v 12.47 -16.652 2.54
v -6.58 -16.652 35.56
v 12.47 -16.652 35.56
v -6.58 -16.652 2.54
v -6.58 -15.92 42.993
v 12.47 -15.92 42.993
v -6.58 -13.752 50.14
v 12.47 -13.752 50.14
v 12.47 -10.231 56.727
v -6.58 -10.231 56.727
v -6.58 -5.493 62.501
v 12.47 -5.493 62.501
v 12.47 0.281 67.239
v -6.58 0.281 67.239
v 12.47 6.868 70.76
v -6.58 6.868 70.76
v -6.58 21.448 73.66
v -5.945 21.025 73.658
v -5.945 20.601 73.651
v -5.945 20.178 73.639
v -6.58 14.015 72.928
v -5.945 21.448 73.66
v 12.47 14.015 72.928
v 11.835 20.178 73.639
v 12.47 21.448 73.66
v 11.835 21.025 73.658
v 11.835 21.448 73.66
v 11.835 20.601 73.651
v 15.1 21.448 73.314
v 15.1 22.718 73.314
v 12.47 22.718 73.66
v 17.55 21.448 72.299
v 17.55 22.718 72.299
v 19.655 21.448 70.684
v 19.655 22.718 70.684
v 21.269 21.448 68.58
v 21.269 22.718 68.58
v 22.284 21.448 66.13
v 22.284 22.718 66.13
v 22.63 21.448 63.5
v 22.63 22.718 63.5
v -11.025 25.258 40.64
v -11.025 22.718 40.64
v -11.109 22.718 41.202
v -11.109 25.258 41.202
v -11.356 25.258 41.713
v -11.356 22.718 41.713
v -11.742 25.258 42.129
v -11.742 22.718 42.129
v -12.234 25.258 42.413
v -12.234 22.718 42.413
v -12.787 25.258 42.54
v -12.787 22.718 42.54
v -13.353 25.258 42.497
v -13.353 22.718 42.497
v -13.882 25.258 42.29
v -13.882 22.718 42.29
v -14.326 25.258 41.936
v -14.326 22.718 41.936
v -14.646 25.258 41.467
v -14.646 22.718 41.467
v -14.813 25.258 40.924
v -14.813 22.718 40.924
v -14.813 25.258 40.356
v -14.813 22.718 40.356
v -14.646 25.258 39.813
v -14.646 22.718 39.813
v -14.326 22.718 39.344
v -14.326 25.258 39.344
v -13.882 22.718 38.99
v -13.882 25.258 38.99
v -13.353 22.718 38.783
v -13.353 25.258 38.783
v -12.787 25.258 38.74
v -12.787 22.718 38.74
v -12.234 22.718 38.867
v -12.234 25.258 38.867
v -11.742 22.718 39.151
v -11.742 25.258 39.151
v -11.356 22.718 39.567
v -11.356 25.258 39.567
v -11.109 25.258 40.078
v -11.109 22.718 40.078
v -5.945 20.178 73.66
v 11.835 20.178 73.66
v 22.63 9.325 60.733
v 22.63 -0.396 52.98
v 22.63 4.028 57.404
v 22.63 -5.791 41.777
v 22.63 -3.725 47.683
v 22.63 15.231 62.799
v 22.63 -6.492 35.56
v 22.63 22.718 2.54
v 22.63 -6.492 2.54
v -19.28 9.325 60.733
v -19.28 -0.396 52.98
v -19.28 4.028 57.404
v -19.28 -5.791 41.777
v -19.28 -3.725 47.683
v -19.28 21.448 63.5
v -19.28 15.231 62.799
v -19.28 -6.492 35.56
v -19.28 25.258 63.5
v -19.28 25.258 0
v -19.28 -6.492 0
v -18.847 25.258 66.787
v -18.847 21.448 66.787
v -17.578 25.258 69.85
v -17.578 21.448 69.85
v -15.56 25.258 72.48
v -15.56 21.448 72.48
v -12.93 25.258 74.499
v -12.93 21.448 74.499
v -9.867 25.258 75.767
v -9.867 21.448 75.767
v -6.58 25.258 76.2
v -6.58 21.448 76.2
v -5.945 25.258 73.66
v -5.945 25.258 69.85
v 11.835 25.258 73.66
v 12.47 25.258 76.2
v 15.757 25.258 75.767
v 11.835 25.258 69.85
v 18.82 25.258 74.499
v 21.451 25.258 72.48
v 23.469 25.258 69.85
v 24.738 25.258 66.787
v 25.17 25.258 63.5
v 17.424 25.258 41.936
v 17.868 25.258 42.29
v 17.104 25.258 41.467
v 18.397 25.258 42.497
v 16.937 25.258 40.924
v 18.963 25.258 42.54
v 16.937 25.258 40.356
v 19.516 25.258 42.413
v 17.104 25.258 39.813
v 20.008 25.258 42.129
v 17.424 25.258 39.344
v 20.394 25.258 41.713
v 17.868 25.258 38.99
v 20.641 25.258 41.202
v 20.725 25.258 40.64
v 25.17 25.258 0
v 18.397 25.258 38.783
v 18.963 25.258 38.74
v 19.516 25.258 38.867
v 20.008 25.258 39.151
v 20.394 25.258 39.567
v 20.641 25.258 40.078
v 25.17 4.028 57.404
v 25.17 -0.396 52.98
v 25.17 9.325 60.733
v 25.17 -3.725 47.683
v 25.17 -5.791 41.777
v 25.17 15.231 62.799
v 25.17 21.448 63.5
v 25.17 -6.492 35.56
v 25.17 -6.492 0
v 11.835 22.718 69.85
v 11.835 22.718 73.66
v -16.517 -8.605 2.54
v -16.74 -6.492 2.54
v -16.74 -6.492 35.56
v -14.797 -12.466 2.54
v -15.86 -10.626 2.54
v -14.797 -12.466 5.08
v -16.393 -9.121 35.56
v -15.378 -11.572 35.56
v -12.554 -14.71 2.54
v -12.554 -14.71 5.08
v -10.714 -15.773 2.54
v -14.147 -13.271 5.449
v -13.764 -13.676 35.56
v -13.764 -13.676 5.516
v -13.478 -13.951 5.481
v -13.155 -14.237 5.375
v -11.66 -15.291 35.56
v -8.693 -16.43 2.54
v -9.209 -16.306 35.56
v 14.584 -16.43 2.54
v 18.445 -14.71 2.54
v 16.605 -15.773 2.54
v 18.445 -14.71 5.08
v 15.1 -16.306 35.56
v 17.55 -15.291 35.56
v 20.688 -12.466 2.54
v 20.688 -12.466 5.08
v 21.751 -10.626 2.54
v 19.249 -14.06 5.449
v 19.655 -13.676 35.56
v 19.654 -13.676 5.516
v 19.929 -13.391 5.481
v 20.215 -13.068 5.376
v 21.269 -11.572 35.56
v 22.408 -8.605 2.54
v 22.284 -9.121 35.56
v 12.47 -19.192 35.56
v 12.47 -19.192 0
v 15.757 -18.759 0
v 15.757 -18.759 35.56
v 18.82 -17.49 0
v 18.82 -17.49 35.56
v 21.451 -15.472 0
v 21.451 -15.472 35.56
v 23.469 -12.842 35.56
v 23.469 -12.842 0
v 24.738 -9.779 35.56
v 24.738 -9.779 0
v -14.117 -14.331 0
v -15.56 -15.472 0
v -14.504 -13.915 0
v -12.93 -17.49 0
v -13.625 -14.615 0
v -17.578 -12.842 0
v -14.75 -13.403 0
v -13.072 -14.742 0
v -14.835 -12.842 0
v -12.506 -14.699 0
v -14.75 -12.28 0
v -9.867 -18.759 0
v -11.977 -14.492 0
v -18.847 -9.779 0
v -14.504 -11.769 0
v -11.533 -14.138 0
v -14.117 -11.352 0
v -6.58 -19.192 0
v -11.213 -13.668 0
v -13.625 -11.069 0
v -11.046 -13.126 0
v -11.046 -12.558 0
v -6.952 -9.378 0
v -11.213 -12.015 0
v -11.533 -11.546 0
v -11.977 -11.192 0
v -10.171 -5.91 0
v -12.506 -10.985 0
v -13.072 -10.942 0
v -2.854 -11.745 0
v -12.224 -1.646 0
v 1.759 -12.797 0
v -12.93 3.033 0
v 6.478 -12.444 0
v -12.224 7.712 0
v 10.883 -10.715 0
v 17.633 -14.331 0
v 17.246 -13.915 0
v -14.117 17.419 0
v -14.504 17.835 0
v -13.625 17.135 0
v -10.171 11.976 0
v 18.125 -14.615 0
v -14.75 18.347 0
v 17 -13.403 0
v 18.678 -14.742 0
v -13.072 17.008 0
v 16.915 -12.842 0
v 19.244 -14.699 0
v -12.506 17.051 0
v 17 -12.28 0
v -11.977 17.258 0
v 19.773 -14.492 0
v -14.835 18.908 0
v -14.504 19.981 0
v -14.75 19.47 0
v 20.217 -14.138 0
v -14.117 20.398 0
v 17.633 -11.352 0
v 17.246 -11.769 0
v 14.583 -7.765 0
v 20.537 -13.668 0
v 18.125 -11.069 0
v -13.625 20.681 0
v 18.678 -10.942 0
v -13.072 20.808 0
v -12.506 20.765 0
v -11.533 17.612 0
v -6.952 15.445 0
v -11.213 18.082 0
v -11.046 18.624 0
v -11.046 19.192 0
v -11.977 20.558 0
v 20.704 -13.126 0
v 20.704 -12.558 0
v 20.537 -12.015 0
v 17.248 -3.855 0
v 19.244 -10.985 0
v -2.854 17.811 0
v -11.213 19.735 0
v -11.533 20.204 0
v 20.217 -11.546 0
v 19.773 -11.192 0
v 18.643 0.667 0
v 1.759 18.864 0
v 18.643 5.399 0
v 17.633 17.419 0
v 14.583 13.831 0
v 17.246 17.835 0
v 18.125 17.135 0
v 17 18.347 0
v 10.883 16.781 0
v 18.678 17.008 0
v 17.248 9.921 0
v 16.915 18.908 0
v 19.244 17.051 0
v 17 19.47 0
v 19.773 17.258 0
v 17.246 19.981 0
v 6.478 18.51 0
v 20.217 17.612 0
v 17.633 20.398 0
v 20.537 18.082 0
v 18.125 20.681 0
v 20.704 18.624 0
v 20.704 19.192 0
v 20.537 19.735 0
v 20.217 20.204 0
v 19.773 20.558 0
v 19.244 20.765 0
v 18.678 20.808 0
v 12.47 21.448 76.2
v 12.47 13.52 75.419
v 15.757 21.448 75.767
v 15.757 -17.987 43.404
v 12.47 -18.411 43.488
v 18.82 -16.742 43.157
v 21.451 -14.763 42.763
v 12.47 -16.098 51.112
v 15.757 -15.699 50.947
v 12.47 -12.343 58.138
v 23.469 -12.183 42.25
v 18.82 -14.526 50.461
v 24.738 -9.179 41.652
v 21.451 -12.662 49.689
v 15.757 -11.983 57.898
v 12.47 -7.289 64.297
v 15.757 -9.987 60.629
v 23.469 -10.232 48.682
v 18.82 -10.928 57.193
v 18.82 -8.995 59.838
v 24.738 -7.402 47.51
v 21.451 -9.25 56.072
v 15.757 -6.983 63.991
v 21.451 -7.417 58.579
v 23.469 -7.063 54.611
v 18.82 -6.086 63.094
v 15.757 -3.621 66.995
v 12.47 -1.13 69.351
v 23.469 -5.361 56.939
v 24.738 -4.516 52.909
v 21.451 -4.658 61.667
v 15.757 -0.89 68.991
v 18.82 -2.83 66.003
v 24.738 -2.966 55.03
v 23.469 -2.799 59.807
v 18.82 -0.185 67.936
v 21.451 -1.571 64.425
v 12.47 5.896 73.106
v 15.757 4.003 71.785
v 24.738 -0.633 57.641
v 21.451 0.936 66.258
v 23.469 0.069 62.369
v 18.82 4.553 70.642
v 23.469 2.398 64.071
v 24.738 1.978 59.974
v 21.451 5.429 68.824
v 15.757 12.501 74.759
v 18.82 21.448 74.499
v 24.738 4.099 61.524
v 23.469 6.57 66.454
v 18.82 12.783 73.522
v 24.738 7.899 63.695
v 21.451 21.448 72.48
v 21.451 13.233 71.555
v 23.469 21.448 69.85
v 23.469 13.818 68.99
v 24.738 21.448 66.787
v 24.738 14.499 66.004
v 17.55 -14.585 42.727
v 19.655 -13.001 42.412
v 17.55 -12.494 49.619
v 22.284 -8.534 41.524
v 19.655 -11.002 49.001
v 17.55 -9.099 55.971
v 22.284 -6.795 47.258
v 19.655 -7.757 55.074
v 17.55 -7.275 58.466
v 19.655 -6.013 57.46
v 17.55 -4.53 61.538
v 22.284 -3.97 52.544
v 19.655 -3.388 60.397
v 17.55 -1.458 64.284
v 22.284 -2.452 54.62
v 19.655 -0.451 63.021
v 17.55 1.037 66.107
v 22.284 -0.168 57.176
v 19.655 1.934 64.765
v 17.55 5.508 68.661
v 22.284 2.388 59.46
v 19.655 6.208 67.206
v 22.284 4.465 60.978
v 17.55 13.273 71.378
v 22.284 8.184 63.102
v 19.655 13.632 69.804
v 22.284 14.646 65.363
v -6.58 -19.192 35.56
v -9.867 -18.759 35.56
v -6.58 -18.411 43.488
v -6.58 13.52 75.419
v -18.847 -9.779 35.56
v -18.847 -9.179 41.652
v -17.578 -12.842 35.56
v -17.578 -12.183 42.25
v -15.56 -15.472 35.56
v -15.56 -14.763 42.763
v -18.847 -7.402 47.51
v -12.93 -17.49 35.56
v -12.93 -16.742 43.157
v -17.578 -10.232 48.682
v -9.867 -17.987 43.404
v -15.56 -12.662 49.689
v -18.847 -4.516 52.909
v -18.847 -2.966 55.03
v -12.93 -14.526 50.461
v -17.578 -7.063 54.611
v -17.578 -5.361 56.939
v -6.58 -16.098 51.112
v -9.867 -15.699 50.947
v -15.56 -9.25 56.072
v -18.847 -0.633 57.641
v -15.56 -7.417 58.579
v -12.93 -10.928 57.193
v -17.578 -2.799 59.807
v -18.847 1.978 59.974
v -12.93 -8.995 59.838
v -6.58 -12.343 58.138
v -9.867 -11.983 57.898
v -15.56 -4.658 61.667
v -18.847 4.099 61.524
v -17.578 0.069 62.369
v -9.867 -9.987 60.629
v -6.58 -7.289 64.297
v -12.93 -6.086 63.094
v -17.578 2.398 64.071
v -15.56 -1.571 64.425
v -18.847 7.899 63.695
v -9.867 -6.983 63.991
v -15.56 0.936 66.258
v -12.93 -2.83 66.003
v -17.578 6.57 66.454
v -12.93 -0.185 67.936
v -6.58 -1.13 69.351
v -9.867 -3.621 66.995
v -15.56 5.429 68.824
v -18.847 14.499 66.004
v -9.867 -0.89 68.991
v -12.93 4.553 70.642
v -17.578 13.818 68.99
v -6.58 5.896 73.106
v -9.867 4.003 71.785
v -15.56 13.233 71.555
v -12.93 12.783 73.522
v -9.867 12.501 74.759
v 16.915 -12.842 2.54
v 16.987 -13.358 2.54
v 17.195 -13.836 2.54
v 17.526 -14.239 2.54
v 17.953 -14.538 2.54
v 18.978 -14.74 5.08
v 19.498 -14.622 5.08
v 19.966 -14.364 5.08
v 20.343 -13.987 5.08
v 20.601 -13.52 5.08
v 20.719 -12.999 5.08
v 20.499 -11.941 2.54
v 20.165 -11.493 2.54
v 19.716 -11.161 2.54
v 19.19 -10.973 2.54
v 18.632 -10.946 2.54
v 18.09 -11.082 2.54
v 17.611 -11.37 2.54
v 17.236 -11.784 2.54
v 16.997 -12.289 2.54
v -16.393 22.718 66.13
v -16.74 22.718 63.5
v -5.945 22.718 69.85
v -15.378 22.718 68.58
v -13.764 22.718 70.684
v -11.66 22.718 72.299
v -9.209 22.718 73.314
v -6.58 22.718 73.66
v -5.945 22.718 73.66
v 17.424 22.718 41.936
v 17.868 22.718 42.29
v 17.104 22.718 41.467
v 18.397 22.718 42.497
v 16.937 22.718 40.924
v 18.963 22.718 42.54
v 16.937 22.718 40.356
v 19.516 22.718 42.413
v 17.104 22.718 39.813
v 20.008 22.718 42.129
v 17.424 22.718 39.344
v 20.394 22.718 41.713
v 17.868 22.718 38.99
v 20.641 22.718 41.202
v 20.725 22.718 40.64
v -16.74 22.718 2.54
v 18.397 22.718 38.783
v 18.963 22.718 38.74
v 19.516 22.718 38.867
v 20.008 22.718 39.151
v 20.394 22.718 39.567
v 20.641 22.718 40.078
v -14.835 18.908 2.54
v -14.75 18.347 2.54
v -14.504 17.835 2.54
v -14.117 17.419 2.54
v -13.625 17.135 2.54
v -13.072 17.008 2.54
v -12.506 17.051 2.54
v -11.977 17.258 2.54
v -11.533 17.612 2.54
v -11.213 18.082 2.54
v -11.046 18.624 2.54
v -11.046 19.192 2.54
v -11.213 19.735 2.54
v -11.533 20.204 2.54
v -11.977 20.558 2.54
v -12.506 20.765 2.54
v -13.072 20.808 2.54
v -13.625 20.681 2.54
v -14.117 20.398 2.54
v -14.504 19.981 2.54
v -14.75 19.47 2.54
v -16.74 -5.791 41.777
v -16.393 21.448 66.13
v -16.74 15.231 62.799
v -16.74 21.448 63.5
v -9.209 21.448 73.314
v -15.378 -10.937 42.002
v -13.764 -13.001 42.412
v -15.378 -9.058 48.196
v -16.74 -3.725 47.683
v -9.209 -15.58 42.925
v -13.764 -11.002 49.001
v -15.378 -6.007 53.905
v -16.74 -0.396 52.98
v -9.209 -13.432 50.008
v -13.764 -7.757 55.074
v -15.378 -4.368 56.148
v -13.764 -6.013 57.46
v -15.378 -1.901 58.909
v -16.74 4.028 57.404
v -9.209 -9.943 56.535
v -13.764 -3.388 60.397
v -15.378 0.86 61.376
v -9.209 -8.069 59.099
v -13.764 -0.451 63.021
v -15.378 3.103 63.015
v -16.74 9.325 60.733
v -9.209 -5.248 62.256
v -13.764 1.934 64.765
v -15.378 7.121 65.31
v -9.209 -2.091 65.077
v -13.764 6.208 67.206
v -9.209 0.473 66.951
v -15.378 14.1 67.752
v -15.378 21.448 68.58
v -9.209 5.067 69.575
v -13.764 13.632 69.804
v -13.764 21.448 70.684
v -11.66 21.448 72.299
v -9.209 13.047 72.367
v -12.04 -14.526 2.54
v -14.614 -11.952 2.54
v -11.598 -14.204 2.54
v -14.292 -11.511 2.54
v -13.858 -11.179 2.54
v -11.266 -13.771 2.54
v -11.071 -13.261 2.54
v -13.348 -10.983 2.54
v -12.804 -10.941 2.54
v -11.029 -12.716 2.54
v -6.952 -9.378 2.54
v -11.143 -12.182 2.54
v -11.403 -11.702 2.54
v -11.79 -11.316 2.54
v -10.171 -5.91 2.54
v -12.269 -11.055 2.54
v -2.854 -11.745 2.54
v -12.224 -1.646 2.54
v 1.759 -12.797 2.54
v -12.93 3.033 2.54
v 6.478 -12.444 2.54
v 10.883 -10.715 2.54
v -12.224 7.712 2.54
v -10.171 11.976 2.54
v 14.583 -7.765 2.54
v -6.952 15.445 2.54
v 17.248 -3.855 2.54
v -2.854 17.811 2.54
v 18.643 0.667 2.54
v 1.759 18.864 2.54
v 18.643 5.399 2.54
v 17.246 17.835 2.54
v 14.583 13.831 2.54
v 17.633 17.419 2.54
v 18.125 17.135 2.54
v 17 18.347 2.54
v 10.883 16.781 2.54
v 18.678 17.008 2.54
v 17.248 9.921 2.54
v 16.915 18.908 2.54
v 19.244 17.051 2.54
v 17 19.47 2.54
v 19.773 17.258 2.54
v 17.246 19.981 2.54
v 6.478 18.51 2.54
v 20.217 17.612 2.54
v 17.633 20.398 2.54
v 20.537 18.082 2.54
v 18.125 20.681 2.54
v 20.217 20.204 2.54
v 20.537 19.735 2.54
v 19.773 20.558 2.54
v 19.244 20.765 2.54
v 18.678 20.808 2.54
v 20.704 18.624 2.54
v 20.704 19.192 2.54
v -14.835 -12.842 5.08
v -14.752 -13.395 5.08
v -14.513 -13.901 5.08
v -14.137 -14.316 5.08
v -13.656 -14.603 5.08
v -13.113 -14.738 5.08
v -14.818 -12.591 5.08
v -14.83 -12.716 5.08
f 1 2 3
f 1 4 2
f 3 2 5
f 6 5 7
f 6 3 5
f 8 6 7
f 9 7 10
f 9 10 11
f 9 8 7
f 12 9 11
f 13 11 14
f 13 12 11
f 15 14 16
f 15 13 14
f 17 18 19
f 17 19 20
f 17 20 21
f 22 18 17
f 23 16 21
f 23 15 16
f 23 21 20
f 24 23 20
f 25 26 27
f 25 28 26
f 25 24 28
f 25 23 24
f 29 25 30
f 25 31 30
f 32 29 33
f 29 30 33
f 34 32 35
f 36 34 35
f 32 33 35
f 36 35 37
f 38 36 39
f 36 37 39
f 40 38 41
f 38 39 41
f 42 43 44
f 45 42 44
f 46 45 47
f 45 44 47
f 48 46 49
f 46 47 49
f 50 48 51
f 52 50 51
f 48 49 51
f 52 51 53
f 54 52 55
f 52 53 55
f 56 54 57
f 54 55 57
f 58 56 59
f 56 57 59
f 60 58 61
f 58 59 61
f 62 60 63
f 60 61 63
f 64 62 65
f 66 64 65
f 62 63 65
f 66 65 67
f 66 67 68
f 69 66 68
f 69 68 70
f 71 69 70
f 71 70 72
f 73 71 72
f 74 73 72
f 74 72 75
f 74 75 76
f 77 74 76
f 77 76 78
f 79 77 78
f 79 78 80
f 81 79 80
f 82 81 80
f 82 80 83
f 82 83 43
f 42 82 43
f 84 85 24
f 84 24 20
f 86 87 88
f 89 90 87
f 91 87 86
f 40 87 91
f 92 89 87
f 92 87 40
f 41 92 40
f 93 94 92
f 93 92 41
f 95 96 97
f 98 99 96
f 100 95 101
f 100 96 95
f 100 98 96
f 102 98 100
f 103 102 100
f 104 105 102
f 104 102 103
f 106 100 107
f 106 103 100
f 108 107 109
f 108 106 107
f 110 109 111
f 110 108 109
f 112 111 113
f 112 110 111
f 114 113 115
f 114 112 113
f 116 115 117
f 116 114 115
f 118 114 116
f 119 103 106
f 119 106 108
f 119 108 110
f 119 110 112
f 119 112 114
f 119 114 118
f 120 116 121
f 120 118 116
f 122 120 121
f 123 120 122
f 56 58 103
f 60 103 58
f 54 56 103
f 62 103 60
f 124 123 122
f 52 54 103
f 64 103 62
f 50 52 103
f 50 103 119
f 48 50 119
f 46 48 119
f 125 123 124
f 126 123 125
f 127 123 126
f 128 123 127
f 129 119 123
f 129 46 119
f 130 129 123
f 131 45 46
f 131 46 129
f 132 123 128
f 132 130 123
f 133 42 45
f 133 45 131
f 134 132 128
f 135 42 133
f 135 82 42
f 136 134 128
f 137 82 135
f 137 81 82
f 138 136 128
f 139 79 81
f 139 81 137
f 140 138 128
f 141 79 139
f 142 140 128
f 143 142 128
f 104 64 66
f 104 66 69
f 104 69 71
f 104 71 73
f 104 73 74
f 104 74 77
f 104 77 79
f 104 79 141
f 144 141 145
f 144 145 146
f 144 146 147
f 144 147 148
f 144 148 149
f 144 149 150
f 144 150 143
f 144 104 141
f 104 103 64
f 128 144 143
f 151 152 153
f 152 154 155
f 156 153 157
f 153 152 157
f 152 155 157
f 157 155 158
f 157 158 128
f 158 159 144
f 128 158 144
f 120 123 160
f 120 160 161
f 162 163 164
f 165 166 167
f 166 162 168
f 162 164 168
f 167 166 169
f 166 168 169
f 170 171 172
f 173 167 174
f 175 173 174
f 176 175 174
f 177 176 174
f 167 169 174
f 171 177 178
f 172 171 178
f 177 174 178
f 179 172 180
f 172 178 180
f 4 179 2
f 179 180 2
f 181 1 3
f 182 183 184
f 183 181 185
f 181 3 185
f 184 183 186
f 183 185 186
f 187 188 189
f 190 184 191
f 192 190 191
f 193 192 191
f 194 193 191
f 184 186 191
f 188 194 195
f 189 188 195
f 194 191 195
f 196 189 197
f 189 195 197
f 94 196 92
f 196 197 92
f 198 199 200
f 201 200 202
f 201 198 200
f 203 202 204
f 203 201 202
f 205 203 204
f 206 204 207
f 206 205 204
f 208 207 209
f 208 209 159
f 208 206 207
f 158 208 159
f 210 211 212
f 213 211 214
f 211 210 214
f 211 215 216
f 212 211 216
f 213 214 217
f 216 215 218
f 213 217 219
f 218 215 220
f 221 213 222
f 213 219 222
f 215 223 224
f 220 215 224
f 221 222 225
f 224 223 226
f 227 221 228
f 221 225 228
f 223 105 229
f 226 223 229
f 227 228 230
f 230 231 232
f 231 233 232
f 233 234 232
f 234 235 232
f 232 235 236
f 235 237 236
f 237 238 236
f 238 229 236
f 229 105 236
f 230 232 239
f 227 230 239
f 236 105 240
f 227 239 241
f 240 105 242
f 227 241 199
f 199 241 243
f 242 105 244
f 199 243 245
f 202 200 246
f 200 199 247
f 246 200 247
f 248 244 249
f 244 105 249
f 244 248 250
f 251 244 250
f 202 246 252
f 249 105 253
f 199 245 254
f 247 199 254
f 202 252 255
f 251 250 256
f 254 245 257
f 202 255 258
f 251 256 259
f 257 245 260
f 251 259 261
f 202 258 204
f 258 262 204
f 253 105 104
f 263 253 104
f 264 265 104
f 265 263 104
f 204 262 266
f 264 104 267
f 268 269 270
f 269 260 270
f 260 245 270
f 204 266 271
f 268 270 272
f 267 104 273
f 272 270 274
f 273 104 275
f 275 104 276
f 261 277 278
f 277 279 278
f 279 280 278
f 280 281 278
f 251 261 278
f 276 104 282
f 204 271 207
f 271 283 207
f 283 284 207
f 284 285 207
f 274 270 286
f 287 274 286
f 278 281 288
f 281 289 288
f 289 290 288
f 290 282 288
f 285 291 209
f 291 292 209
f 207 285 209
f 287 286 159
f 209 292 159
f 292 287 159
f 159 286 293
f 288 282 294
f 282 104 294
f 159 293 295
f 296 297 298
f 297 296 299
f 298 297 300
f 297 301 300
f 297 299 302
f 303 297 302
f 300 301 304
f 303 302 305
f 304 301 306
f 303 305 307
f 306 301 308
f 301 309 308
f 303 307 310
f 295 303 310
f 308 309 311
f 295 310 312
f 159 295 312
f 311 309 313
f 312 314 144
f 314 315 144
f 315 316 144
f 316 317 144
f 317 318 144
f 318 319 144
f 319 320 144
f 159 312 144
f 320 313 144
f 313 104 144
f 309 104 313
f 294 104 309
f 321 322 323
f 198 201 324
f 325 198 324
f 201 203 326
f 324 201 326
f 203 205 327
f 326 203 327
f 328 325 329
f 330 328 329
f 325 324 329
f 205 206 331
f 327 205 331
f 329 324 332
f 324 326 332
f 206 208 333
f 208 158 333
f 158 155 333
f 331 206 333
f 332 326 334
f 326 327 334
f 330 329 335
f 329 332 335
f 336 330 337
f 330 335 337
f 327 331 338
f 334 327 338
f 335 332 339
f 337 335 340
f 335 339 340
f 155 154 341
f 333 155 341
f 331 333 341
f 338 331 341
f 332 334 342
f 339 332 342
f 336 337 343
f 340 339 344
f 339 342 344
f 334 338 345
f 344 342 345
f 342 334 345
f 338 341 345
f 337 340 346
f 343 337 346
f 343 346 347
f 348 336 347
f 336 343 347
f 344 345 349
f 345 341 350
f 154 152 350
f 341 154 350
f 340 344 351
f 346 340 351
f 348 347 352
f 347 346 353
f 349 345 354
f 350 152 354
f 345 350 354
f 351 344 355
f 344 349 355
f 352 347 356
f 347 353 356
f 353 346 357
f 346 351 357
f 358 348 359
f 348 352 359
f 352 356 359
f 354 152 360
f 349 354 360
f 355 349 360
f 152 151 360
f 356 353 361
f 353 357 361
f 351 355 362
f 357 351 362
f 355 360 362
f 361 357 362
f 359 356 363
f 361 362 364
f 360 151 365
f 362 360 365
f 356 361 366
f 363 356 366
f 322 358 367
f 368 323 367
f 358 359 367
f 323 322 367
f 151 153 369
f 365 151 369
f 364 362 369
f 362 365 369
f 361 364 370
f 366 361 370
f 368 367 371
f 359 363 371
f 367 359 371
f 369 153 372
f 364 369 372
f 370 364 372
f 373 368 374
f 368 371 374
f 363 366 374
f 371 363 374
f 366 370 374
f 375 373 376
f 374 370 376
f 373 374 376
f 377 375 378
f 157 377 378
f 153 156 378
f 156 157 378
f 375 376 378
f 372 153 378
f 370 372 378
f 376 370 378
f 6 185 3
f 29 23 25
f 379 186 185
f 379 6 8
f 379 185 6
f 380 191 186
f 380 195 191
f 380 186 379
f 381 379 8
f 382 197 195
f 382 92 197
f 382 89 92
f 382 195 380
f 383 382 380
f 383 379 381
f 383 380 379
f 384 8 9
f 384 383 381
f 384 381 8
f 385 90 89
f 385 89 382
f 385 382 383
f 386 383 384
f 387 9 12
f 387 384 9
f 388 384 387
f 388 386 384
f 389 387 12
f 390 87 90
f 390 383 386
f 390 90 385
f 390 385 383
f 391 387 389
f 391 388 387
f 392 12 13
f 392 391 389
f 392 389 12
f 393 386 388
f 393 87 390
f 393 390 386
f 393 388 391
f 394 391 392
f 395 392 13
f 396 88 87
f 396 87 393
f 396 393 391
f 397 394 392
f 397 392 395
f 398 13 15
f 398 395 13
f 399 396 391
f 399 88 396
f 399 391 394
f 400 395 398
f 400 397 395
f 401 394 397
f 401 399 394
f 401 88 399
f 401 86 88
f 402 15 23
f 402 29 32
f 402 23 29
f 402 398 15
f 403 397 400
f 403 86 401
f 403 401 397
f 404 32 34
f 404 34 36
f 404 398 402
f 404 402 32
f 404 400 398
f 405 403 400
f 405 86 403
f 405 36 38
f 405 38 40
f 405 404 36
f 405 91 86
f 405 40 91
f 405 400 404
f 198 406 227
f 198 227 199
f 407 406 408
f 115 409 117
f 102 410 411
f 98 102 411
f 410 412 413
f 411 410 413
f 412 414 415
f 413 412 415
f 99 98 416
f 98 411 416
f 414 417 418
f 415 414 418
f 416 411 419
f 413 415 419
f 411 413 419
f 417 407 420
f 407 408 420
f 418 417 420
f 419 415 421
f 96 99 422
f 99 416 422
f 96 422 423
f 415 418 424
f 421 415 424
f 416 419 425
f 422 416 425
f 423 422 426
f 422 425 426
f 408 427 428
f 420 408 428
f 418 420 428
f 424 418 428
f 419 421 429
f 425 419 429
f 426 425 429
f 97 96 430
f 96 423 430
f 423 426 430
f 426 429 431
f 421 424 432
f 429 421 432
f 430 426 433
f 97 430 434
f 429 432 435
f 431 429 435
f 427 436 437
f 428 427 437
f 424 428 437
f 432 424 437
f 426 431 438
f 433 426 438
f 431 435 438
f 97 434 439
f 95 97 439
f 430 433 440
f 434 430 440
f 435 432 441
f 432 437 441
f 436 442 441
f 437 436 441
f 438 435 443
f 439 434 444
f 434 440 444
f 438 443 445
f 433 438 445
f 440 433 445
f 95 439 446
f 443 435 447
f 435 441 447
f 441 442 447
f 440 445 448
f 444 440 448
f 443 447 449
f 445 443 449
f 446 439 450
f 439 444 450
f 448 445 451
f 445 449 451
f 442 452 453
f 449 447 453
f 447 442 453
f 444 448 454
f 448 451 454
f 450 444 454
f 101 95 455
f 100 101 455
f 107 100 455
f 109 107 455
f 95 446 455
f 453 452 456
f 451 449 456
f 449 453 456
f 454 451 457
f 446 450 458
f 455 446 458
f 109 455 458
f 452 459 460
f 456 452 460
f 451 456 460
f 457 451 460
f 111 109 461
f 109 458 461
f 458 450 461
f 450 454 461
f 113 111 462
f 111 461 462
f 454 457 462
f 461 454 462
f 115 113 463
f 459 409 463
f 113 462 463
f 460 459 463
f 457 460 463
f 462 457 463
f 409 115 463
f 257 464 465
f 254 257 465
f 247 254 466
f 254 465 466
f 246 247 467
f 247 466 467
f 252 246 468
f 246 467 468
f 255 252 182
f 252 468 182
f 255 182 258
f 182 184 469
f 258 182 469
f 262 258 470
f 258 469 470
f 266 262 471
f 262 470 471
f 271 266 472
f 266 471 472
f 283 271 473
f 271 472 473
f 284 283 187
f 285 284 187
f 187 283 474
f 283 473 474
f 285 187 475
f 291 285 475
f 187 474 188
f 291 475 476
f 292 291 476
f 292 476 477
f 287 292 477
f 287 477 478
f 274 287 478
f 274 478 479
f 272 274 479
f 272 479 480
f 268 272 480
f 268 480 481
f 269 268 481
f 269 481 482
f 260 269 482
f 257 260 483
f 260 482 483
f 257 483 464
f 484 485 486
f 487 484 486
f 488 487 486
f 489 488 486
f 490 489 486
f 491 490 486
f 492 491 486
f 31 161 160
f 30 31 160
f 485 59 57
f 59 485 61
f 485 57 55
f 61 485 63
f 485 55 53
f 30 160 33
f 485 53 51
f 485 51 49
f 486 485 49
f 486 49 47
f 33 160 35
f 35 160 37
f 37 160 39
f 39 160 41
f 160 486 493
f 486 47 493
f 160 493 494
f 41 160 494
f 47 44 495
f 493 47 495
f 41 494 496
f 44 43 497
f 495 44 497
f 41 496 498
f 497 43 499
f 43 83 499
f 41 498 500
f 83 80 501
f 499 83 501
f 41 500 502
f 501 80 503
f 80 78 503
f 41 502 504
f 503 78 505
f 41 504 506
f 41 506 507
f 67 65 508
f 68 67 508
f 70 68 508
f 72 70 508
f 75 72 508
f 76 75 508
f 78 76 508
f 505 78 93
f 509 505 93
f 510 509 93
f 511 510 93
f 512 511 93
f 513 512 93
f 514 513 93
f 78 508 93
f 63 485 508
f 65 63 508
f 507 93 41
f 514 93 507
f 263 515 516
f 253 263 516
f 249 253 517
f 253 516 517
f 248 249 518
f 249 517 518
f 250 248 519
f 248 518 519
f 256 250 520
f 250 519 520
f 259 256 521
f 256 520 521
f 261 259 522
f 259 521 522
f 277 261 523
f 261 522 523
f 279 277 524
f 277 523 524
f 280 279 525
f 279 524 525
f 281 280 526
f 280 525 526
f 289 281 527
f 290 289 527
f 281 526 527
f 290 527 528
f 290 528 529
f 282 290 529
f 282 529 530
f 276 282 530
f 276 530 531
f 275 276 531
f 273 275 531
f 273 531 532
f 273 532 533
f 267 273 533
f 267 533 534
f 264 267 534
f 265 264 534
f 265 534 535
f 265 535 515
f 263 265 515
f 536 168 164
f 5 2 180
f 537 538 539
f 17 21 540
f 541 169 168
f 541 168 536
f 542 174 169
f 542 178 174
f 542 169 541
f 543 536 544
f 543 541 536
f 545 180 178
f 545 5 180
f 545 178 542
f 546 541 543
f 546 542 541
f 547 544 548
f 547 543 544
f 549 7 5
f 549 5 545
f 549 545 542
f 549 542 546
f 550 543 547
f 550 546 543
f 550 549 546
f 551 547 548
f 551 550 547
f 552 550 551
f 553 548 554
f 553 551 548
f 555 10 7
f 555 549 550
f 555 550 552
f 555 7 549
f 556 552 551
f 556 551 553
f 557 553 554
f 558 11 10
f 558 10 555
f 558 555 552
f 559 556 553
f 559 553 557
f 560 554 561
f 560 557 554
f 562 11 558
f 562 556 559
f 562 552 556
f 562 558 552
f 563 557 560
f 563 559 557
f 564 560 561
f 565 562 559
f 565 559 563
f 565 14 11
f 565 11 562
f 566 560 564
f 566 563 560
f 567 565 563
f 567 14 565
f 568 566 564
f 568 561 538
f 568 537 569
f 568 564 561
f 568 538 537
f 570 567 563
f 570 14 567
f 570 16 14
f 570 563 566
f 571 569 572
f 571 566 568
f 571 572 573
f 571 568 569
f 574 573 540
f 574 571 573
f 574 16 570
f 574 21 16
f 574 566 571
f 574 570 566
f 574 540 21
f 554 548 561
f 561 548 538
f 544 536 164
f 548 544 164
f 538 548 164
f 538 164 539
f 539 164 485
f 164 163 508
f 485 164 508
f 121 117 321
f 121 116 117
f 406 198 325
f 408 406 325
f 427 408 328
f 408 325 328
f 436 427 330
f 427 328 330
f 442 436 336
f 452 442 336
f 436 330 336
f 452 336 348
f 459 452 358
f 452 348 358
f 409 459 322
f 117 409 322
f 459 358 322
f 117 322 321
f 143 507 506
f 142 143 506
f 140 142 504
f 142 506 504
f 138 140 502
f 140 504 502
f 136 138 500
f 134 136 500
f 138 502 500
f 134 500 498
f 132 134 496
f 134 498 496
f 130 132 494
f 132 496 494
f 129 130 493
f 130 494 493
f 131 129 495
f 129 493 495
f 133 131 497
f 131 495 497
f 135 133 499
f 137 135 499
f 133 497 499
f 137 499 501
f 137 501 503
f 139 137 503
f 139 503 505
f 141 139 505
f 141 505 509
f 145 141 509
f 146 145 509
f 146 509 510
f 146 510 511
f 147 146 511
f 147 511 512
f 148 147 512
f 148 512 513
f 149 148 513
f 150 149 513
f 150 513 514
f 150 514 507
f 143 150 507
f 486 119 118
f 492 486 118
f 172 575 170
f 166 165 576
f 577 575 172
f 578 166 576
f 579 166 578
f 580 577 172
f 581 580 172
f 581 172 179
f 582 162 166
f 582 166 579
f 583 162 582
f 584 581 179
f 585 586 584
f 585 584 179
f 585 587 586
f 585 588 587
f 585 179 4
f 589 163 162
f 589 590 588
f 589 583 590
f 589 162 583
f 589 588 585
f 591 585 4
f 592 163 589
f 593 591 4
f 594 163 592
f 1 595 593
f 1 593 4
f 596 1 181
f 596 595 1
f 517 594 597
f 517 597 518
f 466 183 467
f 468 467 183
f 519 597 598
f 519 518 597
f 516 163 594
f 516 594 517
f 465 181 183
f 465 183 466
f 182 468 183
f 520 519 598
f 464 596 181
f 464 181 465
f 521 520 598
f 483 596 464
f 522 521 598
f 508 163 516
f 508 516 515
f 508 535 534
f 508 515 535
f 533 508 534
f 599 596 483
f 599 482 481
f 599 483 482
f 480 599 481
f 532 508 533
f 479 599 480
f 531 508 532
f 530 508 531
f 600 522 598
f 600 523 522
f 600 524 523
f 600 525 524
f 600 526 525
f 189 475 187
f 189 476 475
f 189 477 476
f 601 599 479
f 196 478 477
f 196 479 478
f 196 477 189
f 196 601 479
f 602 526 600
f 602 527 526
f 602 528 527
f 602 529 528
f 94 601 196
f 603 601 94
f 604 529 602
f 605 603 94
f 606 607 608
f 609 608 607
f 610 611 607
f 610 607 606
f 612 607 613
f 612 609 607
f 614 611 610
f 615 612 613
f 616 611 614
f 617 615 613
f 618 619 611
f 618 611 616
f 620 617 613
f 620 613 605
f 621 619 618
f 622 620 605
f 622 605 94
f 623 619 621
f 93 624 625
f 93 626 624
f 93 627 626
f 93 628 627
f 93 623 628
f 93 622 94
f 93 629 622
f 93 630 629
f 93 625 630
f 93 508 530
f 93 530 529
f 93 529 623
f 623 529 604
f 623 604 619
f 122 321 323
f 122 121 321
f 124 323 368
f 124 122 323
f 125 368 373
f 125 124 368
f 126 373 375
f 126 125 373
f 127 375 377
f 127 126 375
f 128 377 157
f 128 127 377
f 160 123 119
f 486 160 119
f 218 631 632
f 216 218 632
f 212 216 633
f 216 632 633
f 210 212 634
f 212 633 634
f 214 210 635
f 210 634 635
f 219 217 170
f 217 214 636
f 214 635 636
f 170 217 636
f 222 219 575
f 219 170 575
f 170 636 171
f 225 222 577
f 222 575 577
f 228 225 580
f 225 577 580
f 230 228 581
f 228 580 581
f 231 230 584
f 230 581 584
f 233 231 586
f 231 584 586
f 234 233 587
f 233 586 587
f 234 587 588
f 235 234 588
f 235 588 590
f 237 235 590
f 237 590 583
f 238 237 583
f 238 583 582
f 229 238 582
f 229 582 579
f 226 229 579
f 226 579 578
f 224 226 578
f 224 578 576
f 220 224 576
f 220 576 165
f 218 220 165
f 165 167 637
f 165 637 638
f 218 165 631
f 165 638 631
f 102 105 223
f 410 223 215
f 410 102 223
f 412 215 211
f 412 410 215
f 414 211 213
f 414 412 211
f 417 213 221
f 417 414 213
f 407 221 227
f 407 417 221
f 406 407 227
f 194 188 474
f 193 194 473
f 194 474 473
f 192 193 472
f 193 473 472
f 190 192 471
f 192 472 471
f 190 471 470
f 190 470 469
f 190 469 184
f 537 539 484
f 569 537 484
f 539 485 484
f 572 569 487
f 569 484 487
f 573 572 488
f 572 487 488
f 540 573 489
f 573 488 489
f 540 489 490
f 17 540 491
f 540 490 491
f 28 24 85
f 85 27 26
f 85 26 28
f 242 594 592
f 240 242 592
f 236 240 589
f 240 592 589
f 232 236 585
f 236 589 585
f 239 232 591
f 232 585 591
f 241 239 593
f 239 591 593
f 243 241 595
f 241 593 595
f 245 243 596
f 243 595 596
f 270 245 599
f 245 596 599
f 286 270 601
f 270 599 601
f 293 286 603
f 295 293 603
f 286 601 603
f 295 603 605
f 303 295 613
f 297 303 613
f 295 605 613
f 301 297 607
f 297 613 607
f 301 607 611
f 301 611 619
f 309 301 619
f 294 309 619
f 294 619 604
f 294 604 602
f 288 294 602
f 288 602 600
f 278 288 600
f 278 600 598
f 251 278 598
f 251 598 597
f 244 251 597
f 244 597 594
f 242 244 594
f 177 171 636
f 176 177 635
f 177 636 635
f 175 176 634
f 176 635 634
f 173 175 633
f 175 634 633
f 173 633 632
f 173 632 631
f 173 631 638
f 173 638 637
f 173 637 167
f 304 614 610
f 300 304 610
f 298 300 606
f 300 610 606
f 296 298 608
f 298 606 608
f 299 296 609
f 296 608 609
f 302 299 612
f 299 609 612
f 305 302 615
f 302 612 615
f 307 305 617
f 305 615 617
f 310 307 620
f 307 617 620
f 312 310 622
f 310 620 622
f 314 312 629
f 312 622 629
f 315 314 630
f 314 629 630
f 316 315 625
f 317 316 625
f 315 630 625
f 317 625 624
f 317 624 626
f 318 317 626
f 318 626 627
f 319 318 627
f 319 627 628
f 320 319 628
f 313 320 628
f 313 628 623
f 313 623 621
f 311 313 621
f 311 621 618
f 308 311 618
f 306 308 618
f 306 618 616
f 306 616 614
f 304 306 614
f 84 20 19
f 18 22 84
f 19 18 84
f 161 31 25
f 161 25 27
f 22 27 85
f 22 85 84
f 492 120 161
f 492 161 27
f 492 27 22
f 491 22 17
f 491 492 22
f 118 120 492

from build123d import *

# Parameters (mm, degrees)
F0_W      = 44.45
F0_H      = 44.45
F1_DEPTH  = 76.2
F2_R      = 40.64
F4_R      = 12.7
F6_T      = -2.54
F3_W      = 17.78
F3_H      = 3.81
F7_DEPTH  = 5.08
F8_D      = 3.81
F8_DEPTH  = 5.08
F8_TIP    = 1.1446394792
F9_D      = 3.81
F9_DEPTH  = 5.08
F9_TIP    = 1.1446394792
F10_D     = 31.75
F10_DEPTH = 5.08
F10_TIP   = 9.5386623271


with BuildPart() as f1:
    # F0 (on Top) → F1 (new body)
    with BuildSketch(Plane.XY):
        with Locations((2.945480904, 3.0331164956)):
            Rectangle(F0_W, F0_H)
    extrude(amount=F1_DEPTH)

    # F2
    f2_edges = [f1.edges().sort_by_distance(p)[0] for p in [
        (2.945481, -19.191884, 76.2),
    ]]
    fillet(f2_edges, radius=F2_R)

    # F4
    f4_edges = [f1.edges().sort_by_distance(p)[0] for p in [
        (25.170481, -7.288703, 64.29682),
        (-19.279519, -7.288703, 64.29682),
    ]]
    fillet(f4_edges, radius=F4_R)

    # F6 (hollow: no face is removed)
    offset(amount=F6_T, mode=Mode.SUBTRACT)

    # F3 (on face) → F7 (cut)
    with BuildSketch(Plane(origin=(0, 25.2581164956, 0), x_dir=(-1, 0, 0), z_dir=(0, 1, 0))):
        with Locations((-2.945480904, 71.755)):
            Rectangle(F3_W, F3_H)
    extrude(amount=-F7_DEPTH, mode=Mode.SUBTRACT)

    # F8
    with Locations(Plane(origin=(0, 0, 0), x_dir=(1, 0, 0), z_dir=(0, 0, -1))):
        with Locations((18.820480904, 12.8418835044), (-12.929519096, 12.8418835044), (18.820480904, -18.9081164956), (-12.929519096, -18.9081164956)):
            Hole(F8_D / 2, depth=F8_DEPTH)
            with Locations((0, 0, -(F8_DEPTH + F8_TIP / 2))):  # 118° drill point
                Cone(0, F8_D / 2, F8_TIP, mode=Mode.SUBTRACT)

    # F9
    with Locations(Plane(origin=(0, 25.2581164956, 0), x_dir=(-1, 0, 0), z_dir=(0, 1, 0))):
        with Locations((-18.820480904, 40.64), (12.929519096, 40.64)):
            Hole(F9_D / 2, depth=F9_DEPTH)
            with Locations((0, 0, -(F9_DEPTH + F9_TIP / 2))):  # 118° drill point
                Cone(0, F9_D / 2, F9_TIP, mode=Mode.SUBTRACT)

    # F10
    with Locations(Plane(origin=(0, 0, 0), x_dir=(1, 0, 0), z_dir=(0, 0, -1))):
        with Locations((2.945480904, -3.0331164956)):
            Hole(F10_D / 2, depth=F10_DEPTH)
            with Locations((0, 0, -(F10_DEPTH + F10_TIP / 2))):  # 118° drill point
                Cone(0, F10_D / 2, F10_TIP, mode=Mode.SUBTRACT)


solid = f1.part
